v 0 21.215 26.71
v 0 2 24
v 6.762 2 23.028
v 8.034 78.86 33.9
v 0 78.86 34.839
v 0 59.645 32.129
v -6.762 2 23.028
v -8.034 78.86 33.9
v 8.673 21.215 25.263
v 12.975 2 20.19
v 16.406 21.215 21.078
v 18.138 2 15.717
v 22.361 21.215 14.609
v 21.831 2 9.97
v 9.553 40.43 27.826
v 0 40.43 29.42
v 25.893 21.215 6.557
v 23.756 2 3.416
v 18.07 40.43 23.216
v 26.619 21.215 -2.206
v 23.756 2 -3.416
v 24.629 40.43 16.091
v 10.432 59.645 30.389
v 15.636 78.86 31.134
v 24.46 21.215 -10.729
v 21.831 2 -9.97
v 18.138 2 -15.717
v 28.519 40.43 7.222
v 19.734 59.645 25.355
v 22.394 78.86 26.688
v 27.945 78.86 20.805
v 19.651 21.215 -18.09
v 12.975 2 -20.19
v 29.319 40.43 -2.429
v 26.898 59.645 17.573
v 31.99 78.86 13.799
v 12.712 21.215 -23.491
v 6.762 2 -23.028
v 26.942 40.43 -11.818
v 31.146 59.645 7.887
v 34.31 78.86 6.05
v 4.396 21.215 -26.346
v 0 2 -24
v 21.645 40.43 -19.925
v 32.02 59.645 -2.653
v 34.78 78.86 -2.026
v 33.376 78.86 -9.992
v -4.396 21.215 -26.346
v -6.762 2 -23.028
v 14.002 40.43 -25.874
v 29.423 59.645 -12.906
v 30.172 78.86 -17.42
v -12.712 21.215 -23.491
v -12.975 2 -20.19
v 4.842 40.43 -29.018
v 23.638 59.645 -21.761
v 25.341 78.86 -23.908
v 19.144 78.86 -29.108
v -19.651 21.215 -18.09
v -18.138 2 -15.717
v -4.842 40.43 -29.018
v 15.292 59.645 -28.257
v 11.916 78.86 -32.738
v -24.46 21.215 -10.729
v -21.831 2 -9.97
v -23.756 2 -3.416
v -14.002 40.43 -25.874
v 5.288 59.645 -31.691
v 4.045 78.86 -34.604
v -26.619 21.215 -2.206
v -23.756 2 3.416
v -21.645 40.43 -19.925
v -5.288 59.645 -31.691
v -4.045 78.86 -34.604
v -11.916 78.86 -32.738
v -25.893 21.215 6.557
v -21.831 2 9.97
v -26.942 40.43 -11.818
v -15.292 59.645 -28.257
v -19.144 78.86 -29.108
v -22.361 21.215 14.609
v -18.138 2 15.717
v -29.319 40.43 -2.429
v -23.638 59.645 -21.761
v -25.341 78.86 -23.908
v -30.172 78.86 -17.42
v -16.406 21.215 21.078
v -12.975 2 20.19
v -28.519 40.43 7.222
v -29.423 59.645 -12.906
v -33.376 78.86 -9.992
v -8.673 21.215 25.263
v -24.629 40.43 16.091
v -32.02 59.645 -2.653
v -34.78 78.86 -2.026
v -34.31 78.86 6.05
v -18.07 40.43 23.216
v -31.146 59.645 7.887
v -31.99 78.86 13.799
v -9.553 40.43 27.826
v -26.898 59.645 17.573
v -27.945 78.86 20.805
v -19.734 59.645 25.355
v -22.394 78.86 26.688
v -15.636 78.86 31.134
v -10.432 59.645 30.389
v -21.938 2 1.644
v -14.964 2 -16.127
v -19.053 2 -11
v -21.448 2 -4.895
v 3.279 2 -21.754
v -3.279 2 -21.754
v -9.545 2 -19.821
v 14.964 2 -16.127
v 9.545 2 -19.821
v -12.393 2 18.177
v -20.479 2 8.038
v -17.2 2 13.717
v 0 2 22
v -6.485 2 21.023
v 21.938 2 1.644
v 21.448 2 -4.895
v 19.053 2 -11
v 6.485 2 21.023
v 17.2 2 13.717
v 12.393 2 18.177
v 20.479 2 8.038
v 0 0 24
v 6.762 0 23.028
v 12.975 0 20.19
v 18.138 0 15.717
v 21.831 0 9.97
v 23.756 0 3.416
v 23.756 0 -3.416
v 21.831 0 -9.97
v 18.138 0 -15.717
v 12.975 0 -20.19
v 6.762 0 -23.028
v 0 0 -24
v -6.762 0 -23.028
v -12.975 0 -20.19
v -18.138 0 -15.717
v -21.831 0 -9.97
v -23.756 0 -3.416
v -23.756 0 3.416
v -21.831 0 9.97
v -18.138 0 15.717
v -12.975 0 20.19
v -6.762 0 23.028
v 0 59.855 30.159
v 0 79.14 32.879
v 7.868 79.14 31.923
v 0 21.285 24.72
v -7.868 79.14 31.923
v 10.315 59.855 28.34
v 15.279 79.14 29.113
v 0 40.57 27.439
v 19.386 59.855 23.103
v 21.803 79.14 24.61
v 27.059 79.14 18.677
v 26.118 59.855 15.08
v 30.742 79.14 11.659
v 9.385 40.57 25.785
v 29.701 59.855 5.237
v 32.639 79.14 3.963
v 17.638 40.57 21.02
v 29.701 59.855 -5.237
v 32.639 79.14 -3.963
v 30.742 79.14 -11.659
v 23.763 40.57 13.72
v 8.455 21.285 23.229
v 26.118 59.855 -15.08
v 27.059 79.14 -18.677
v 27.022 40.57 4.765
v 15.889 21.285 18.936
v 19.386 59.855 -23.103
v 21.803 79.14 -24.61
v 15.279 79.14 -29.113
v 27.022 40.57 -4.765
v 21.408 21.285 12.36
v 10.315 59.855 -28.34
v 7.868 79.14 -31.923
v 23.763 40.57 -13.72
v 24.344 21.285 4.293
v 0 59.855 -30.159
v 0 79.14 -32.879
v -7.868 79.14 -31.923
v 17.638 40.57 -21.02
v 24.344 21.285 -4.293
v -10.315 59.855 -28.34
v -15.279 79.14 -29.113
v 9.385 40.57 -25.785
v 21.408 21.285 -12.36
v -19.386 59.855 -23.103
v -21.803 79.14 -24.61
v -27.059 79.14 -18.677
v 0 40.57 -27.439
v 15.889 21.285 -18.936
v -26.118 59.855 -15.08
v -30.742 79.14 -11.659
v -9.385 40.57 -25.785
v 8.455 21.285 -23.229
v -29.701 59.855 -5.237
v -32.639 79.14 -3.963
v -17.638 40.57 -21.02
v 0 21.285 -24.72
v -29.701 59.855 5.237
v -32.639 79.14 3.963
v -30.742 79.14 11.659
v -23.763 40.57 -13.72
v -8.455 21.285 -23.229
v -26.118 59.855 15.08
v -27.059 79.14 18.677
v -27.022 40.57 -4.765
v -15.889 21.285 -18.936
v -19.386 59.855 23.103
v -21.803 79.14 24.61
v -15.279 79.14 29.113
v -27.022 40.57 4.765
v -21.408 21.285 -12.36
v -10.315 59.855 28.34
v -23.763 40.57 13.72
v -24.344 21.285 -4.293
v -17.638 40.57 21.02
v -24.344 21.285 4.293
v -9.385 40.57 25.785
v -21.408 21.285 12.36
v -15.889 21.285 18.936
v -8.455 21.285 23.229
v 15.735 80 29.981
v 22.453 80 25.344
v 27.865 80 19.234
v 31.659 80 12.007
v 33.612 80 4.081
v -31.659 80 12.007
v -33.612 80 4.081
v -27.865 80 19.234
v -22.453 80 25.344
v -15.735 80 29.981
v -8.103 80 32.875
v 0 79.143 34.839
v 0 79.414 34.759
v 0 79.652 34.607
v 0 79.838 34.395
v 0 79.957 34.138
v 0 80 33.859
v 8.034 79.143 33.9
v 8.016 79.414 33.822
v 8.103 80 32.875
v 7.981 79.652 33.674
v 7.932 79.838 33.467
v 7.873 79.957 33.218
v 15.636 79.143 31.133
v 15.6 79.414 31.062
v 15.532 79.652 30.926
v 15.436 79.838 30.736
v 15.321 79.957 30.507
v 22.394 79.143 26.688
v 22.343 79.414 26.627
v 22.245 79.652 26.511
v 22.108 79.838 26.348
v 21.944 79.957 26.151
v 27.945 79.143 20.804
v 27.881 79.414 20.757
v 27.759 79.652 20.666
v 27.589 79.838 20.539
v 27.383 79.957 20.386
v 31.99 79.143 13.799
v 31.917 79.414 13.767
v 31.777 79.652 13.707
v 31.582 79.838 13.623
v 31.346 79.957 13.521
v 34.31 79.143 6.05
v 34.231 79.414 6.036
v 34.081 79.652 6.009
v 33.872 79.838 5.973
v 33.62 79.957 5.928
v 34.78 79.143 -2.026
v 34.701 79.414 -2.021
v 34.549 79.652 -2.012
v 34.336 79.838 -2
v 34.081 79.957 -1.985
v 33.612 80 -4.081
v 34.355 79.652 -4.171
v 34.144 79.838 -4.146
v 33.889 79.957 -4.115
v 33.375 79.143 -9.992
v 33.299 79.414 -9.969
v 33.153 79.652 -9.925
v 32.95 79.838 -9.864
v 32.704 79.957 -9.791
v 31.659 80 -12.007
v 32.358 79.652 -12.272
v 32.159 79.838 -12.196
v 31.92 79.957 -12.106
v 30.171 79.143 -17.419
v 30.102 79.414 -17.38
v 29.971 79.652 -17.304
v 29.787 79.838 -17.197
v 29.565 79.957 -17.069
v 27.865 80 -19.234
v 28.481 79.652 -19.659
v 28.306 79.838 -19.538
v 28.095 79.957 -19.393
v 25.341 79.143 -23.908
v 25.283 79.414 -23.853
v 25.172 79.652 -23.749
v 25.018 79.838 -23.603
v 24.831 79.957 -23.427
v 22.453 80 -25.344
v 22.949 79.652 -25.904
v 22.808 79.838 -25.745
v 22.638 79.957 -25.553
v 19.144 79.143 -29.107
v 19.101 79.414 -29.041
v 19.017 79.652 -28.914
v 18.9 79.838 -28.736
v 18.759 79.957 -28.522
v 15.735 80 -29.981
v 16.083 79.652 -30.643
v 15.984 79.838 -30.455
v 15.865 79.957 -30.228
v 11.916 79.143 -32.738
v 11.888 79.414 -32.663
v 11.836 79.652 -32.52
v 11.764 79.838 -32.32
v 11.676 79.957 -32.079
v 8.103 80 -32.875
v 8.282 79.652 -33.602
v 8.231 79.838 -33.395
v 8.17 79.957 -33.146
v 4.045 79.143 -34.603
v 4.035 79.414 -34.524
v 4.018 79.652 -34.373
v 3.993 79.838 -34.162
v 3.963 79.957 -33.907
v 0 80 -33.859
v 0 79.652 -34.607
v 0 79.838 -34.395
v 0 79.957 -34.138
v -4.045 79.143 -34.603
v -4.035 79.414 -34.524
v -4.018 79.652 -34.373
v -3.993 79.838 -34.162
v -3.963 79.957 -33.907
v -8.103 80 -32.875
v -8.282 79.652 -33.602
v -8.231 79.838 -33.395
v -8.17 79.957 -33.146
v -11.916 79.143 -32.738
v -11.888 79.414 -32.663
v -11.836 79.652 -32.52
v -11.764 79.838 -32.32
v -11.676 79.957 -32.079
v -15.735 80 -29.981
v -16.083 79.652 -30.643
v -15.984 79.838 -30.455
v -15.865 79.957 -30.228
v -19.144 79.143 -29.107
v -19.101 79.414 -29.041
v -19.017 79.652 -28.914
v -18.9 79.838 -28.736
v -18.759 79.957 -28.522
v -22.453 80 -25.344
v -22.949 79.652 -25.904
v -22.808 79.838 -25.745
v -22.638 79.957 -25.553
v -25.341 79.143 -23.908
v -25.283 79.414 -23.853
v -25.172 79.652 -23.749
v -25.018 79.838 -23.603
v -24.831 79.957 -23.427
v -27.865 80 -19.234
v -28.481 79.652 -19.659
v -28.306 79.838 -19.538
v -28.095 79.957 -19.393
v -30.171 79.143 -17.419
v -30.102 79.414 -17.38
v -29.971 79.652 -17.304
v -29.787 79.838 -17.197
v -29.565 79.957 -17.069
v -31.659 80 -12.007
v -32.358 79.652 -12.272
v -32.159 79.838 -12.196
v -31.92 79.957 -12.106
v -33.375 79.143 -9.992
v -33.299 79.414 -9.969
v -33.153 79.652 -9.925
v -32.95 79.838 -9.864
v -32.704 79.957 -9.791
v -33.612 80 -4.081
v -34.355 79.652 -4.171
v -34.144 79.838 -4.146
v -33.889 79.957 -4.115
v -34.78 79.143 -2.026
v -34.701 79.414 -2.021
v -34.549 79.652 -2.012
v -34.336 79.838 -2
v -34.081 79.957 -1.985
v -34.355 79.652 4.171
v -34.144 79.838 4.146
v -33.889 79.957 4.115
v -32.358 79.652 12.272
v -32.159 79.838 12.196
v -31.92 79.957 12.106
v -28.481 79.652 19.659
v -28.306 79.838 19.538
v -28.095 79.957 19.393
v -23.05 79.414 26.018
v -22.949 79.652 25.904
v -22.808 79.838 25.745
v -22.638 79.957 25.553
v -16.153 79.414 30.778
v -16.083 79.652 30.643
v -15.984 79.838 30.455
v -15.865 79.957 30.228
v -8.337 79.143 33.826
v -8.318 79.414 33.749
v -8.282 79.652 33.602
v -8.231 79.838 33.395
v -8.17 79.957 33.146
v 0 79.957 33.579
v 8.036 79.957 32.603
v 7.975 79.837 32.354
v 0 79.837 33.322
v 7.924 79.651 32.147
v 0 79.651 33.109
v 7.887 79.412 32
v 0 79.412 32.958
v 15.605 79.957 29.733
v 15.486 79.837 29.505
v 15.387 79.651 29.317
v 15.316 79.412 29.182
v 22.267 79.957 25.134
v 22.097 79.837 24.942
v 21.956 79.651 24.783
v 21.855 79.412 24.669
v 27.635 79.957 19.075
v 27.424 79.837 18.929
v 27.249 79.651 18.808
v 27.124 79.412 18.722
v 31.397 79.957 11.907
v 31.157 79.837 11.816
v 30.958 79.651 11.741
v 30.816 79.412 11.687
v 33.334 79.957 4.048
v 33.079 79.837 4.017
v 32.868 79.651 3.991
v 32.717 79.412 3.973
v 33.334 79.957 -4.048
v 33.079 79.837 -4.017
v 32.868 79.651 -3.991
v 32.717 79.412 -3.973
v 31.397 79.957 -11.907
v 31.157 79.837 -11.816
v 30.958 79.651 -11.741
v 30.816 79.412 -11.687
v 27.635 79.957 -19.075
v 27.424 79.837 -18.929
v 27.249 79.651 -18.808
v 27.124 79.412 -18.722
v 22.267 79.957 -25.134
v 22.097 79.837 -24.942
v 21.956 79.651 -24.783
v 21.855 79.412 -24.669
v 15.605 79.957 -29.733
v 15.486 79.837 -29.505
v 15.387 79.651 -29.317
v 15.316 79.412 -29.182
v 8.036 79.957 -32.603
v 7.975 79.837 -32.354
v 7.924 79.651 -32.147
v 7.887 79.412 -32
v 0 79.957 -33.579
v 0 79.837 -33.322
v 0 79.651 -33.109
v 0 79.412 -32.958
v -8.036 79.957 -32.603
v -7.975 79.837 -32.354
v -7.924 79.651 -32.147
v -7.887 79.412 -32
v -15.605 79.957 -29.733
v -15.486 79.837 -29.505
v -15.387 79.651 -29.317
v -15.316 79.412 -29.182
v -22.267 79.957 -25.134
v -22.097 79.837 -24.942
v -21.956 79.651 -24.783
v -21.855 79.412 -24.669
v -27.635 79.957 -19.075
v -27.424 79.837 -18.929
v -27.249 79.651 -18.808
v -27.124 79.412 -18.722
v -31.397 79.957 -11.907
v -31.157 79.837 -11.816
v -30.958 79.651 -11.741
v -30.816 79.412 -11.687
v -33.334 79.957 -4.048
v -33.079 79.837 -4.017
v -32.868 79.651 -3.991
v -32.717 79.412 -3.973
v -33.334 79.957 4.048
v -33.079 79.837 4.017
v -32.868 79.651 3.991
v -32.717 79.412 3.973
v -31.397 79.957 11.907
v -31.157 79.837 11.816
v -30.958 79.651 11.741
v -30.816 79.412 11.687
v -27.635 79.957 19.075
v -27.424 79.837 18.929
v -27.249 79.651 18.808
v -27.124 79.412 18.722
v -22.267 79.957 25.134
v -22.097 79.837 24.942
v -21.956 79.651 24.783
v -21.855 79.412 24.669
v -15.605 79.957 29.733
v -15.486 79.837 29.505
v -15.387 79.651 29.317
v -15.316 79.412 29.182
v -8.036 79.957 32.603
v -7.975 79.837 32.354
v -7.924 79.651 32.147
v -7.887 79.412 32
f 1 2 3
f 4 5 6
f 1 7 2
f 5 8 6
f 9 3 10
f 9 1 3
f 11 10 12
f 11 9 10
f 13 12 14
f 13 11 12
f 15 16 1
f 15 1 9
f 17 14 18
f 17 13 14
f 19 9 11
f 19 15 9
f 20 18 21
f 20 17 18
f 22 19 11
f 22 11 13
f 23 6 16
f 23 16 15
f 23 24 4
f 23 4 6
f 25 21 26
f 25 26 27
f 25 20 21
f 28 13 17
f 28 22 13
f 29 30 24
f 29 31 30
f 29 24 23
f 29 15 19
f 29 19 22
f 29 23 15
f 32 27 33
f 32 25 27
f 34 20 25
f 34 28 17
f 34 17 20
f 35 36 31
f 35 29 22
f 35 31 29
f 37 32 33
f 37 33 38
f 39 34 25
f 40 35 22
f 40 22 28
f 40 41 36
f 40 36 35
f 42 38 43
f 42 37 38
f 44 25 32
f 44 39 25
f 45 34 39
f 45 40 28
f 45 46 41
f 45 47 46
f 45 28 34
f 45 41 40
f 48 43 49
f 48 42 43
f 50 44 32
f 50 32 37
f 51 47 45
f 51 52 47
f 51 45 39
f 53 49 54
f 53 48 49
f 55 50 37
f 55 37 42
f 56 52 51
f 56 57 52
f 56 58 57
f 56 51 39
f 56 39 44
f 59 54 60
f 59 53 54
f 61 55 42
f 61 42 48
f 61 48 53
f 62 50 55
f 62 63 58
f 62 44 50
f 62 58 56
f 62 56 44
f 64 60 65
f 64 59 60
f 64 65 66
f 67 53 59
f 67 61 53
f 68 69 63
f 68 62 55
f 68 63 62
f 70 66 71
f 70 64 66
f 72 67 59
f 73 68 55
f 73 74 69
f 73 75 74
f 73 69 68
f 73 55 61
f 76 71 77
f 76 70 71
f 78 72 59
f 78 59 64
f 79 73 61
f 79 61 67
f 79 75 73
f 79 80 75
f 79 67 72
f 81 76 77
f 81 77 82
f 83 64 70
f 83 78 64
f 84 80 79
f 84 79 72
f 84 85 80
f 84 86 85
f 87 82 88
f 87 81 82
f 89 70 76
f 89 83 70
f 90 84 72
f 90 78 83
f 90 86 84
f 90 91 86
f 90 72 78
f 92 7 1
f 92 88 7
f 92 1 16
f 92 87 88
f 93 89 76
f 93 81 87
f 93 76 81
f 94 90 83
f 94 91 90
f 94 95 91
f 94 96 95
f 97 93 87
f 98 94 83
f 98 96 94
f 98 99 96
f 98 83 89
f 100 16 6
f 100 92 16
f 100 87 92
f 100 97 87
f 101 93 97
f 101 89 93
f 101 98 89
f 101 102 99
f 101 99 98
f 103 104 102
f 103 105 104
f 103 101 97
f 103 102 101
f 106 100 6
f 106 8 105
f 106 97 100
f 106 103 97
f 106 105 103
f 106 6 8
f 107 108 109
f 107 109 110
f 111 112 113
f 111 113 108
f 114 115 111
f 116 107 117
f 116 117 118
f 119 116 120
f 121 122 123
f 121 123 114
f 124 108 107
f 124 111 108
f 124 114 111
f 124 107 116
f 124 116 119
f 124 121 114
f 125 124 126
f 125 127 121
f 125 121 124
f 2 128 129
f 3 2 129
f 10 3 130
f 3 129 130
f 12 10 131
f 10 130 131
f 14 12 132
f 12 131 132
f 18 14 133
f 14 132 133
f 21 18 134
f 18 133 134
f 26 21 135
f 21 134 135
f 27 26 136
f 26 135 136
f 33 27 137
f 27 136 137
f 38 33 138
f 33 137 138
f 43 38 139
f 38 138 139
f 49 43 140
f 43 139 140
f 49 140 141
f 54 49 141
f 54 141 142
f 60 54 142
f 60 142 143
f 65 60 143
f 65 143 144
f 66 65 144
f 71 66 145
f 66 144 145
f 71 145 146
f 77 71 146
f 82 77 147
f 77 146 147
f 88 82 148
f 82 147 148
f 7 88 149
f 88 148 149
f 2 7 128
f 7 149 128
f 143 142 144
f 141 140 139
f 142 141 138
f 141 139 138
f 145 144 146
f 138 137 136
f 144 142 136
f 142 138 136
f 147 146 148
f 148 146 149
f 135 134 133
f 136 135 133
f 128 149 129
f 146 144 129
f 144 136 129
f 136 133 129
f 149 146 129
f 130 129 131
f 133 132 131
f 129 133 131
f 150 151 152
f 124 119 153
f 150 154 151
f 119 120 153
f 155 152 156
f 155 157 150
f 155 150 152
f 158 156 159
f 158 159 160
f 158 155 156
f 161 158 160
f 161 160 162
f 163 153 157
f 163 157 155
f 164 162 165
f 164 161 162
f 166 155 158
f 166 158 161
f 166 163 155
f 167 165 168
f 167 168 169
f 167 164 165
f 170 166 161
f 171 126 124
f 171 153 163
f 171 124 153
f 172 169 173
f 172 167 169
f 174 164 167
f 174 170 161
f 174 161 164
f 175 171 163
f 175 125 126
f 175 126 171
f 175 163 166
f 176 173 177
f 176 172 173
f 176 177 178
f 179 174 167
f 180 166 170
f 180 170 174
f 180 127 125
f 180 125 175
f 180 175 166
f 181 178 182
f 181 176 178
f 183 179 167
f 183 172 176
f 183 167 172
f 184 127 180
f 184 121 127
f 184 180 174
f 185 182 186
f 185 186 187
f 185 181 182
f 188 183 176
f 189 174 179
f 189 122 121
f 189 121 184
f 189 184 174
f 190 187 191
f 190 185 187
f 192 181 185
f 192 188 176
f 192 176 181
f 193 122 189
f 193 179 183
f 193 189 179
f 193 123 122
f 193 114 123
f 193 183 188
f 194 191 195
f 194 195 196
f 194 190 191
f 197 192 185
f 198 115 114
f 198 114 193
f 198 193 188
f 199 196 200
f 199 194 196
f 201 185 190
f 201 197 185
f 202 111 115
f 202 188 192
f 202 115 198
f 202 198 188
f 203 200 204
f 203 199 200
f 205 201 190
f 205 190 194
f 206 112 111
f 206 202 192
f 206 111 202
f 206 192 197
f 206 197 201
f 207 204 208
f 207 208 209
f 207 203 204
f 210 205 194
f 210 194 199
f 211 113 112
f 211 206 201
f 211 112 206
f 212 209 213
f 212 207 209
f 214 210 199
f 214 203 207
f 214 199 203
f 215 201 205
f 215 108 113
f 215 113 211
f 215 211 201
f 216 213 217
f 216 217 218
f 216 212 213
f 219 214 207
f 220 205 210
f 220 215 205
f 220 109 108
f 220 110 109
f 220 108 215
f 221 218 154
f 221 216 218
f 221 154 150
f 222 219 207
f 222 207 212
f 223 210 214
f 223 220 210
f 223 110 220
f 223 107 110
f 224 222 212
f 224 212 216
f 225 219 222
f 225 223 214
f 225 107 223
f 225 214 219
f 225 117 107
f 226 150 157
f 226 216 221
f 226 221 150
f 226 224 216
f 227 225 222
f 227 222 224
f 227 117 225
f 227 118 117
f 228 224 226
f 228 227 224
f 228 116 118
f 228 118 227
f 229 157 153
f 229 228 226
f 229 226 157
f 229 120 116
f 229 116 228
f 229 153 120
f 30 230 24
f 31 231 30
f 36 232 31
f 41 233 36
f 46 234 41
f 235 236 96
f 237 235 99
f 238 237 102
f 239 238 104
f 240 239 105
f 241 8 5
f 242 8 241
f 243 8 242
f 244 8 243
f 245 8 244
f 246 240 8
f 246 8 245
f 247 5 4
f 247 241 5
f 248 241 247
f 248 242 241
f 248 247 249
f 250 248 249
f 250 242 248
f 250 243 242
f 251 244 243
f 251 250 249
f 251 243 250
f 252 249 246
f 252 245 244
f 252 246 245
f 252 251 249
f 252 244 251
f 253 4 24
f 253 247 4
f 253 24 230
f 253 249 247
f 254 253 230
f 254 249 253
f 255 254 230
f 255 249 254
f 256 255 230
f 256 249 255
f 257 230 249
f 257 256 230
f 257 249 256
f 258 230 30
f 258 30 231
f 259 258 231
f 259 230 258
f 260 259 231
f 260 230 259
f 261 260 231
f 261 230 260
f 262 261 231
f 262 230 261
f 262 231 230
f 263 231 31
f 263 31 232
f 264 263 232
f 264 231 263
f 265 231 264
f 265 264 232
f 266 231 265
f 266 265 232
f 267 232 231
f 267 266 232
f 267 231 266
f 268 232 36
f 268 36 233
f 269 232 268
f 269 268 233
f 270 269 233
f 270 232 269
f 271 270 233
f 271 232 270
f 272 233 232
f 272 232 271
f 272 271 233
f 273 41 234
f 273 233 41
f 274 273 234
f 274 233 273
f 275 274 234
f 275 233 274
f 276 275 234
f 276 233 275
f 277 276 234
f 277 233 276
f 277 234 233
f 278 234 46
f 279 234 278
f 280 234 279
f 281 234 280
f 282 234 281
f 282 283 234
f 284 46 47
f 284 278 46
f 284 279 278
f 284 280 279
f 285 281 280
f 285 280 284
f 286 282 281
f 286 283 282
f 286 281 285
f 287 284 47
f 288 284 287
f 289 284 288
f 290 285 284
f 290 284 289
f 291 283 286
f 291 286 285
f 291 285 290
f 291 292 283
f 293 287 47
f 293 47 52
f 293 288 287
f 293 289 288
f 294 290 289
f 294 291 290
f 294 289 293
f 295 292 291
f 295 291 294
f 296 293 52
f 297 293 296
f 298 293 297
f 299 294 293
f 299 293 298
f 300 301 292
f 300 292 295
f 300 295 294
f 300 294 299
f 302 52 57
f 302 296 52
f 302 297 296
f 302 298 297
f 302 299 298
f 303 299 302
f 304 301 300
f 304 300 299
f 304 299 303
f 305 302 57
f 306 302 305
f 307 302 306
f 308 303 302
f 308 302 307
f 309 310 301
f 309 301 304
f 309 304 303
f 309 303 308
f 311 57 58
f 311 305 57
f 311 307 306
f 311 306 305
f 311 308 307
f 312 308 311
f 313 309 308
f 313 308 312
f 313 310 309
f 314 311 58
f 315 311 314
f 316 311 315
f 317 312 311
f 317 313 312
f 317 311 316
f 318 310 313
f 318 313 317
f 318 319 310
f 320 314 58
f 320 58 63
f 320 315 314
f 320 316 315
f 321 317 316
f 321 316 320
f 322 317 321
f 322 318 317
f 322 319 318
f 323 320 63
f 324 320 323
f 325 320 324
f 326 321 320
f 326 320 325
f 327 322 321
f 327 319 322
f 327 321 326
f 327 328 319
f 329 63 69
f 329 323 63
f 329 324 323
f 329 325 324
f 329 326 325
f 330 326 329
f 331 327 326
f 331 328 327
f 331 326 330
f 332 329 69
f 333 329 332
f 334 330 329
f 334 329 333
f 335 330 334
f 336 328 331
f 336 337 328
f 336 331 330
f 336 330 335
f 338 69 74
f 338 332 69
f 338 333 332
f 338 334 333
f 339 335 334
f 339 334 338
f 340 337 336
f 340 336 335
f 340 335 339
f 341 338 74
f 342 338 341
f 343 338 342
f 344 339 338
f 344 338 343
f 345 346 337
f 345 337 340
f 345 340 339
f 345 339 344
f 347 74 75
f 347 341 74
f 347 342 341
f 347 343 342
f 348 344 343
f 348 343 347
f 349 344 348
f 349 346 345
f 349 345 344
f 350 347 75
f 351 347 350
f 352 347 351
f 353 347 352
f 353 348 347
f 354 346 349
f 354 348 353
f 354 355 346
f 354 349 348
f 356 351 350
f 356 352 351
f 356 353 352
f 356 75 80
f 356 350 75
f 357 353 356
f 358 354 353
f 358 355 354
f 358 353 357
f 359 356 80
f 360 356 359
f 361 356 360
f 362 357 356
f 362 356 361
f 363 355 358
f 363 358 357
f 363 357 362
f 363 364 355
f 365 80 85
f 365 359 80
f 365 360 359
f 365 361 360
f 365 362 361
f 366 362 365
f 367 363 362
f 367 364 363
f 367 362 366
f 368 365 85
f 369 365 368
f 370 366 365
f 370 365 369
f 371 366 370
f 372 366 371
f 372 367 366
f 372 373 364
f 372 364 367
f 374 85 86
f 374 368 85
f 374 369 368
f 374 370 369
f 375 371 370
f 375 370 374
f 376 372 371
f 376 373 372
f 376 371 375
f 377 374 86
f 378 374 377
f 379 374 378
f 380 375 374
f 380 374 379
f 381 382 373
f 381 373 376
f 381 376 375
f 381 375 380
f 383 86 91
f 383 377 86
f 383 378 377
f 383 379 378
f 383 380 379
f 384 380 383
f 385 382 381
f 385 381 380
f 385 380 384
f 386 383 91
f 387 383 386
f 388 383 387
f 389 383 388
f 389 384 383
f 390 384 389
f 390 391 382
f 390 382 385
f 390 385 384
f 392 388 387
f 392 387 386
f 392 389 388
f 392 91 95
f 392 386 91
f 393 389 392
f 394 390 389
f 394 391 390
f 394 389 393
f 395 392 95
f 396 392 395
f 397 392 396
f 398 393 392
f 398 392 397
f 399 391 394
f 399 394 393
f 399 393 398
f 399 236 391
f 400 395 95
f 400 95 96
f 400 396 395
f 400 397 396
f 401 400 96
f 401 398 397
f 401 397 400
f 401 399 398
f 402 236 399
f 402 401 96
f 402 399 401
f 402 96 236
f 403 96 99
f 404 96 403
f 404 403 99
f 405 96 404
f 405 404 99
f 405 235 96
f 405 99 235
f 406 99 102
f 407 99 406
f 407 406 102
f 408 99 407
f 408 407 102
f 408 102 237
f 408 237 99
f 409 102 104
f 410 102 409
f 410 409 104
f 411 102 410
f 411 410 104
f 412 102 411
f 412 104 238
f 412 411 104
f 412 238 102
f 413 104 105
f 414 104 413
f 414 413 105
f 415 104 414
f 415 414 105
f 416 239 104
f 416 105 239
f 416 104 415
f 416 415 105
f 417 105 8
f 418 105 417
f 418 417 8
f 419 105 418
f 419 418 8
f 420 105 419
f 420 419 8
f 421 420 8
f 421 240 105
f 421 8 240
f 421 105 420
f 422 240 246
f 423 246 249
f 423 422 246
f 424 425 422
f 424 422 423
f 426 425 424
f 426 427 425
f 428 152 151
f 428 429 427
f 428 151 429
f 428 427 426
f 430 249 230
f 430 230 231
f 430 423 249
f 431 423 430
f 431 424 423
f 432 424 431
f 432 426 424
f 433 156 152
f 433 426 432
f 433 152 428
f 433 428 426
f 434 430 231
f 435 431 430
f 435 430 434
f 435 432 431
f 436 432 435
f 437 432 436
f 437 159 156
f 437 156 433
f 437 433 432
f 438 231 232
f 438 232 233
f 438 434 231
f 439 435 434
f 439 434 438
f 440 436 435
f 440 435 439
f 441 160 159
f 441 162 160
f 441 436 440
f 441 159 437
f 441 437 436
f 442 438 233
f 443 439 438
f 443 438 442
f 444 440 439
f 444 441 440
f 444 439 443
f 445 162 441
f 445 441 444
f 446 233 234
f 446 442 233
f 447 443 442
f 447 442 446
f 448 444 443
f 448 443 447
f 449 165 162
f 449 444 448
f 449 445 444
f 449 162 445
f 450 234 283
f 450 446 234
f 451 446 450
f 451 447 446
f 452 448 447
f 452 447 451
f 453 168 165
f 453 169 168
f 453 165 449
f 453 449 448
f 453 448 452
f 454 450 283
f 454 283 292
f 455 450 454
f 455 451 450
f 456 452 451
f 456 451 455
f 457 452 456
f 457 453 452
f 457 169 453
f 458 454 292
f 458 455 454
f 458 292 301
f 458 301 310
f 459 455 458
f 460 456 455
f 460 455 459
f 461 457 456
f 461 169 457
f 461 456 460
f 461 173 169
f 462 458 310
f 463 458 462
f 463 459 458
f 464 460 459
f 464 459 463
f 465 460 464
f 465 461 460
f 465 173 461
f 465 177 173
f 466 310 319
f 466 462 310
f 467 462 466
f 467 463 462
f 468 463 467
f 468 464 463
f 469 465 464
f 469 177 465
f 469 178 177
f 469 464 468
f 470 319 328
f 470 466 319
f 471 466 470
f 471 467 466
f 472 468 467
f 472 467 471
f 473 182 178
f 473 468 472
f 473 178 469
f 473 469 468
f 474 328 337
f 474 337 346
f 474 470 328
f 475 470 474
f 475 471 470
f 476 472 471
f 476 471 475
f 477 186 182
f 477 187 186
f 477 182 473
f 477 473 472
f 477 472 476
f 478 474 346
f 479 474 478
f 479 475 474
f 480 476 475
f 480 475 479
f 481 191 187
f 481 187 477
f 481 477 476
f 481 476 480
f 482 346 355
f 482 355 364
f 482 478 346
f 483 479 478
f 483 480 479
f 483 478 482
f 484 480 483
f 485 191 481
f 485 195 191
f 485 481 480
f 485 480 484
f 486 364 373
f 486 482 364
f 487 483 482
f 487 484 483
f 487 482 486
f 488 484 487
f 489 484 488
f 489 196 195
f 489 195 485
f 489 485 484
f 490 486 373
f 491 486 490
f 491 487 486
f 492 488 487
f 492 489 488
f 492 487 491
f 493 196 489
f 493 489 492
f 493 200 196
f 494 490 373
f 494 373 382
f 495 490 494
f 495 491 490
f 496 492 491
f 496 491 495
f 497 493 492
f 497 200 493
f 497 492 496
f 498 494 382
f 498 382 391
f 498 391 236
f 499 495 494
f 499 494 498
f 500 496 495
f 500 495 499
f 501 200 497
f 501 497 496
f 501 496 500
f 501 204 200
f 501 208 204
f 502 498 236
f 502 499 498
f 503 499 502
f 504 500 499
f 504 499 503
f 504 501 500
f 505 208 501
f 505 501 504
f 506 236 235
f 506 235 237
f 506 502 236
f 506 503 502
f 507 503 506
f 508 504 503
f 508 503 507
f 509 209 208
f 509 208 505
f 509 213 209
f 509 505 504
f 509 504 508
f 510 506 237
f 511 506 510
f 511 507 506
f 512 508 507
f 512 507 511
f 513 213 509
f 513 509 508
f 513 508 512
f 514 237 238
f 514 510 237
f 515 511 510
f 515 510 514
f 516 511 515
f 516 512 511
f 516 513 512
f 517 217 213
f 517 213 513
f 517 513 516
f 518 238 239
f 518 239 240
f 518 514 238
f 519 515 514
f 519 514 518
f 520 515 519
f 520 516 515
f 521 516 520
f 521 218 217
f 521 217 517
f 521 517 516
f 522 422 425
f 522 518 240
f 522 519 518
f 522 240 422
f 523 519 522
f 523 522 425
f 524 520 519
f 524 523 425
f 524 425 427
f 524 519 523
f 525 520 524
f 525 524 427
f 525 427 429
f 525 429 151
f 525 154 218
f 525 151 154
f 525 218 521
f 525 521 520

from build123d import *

# Parameters (mm, degrees)
CROQUIS1_R              = 24
SALIENTE_EXTRUIR1_DEPTH = 2
REDONDEO1_R             = 1
REDONDEO2_R             = 1


with BuildPart() as part:
    # Croquis1 → Saliente-Extruir1 (new body)
    with BuildSketch(Plane(origin=(0, 0, 0), x_dir=(1, 0, 0), z_dir=(0, 1, 0))):
        with Locations(Location((0, 0, 0), (0, 0, 270))):
            Circle(CROQUIS1_R)
    extrude(amount=SALIENTE_EXTRUIR1_DEPTH)

    # Croquis2 → Revolución1 (revolve)
    with BuildSketch(Plane.XY, mode=Mode.PRIVATE) as revoluci_n1_sk:
        Polygon((24, 2), (35, 80), (33, 80), (22, 2), align=None)
    revolve(revoluci_n1_sk.sketch.rotate(Axis((0, 2, 0), (0, 1, 0)), 270), axis=Axis((0, 2, 0), (0, 1, 0)))

    # Redondeo1
    redondeo1_edges = [part.edges().sort_by_distance(p)[0] for p in [
        (0, 80, -35),
    ]]
    fillet(redondeo1_edges, radius=REDONDEO1_R)

    # Redondeo2
    # the kernel refuses this fillet: 1 mm, written as the material it takes off along each edge
    with BuildSketch(Plane(origin=(0, 80, 0), x_dir=(0, 0, 1), z_dir=(-1, 0, 0))) as redondeo2_piece_1:
        with BuildLine():
            CenterArc((33 + REDONDEO2_R * 0.868869517606, -REDONDEO2_R), REDONDEO2_R, 90, 81.97276249)
            Line((33 - REDONDEO2_R * 0.121332278545, -REDONDEO2_R * 0.860356156953), (33, 0))
            Line((33, 0), (33 + REDONDEO2_R * 0.868869517606, 0))
        make_face()
    revolve(axis=Axis((0, 80, 0), (0, 1, 0)), mode=Mode.SUBTRACT)


solid = part.part
